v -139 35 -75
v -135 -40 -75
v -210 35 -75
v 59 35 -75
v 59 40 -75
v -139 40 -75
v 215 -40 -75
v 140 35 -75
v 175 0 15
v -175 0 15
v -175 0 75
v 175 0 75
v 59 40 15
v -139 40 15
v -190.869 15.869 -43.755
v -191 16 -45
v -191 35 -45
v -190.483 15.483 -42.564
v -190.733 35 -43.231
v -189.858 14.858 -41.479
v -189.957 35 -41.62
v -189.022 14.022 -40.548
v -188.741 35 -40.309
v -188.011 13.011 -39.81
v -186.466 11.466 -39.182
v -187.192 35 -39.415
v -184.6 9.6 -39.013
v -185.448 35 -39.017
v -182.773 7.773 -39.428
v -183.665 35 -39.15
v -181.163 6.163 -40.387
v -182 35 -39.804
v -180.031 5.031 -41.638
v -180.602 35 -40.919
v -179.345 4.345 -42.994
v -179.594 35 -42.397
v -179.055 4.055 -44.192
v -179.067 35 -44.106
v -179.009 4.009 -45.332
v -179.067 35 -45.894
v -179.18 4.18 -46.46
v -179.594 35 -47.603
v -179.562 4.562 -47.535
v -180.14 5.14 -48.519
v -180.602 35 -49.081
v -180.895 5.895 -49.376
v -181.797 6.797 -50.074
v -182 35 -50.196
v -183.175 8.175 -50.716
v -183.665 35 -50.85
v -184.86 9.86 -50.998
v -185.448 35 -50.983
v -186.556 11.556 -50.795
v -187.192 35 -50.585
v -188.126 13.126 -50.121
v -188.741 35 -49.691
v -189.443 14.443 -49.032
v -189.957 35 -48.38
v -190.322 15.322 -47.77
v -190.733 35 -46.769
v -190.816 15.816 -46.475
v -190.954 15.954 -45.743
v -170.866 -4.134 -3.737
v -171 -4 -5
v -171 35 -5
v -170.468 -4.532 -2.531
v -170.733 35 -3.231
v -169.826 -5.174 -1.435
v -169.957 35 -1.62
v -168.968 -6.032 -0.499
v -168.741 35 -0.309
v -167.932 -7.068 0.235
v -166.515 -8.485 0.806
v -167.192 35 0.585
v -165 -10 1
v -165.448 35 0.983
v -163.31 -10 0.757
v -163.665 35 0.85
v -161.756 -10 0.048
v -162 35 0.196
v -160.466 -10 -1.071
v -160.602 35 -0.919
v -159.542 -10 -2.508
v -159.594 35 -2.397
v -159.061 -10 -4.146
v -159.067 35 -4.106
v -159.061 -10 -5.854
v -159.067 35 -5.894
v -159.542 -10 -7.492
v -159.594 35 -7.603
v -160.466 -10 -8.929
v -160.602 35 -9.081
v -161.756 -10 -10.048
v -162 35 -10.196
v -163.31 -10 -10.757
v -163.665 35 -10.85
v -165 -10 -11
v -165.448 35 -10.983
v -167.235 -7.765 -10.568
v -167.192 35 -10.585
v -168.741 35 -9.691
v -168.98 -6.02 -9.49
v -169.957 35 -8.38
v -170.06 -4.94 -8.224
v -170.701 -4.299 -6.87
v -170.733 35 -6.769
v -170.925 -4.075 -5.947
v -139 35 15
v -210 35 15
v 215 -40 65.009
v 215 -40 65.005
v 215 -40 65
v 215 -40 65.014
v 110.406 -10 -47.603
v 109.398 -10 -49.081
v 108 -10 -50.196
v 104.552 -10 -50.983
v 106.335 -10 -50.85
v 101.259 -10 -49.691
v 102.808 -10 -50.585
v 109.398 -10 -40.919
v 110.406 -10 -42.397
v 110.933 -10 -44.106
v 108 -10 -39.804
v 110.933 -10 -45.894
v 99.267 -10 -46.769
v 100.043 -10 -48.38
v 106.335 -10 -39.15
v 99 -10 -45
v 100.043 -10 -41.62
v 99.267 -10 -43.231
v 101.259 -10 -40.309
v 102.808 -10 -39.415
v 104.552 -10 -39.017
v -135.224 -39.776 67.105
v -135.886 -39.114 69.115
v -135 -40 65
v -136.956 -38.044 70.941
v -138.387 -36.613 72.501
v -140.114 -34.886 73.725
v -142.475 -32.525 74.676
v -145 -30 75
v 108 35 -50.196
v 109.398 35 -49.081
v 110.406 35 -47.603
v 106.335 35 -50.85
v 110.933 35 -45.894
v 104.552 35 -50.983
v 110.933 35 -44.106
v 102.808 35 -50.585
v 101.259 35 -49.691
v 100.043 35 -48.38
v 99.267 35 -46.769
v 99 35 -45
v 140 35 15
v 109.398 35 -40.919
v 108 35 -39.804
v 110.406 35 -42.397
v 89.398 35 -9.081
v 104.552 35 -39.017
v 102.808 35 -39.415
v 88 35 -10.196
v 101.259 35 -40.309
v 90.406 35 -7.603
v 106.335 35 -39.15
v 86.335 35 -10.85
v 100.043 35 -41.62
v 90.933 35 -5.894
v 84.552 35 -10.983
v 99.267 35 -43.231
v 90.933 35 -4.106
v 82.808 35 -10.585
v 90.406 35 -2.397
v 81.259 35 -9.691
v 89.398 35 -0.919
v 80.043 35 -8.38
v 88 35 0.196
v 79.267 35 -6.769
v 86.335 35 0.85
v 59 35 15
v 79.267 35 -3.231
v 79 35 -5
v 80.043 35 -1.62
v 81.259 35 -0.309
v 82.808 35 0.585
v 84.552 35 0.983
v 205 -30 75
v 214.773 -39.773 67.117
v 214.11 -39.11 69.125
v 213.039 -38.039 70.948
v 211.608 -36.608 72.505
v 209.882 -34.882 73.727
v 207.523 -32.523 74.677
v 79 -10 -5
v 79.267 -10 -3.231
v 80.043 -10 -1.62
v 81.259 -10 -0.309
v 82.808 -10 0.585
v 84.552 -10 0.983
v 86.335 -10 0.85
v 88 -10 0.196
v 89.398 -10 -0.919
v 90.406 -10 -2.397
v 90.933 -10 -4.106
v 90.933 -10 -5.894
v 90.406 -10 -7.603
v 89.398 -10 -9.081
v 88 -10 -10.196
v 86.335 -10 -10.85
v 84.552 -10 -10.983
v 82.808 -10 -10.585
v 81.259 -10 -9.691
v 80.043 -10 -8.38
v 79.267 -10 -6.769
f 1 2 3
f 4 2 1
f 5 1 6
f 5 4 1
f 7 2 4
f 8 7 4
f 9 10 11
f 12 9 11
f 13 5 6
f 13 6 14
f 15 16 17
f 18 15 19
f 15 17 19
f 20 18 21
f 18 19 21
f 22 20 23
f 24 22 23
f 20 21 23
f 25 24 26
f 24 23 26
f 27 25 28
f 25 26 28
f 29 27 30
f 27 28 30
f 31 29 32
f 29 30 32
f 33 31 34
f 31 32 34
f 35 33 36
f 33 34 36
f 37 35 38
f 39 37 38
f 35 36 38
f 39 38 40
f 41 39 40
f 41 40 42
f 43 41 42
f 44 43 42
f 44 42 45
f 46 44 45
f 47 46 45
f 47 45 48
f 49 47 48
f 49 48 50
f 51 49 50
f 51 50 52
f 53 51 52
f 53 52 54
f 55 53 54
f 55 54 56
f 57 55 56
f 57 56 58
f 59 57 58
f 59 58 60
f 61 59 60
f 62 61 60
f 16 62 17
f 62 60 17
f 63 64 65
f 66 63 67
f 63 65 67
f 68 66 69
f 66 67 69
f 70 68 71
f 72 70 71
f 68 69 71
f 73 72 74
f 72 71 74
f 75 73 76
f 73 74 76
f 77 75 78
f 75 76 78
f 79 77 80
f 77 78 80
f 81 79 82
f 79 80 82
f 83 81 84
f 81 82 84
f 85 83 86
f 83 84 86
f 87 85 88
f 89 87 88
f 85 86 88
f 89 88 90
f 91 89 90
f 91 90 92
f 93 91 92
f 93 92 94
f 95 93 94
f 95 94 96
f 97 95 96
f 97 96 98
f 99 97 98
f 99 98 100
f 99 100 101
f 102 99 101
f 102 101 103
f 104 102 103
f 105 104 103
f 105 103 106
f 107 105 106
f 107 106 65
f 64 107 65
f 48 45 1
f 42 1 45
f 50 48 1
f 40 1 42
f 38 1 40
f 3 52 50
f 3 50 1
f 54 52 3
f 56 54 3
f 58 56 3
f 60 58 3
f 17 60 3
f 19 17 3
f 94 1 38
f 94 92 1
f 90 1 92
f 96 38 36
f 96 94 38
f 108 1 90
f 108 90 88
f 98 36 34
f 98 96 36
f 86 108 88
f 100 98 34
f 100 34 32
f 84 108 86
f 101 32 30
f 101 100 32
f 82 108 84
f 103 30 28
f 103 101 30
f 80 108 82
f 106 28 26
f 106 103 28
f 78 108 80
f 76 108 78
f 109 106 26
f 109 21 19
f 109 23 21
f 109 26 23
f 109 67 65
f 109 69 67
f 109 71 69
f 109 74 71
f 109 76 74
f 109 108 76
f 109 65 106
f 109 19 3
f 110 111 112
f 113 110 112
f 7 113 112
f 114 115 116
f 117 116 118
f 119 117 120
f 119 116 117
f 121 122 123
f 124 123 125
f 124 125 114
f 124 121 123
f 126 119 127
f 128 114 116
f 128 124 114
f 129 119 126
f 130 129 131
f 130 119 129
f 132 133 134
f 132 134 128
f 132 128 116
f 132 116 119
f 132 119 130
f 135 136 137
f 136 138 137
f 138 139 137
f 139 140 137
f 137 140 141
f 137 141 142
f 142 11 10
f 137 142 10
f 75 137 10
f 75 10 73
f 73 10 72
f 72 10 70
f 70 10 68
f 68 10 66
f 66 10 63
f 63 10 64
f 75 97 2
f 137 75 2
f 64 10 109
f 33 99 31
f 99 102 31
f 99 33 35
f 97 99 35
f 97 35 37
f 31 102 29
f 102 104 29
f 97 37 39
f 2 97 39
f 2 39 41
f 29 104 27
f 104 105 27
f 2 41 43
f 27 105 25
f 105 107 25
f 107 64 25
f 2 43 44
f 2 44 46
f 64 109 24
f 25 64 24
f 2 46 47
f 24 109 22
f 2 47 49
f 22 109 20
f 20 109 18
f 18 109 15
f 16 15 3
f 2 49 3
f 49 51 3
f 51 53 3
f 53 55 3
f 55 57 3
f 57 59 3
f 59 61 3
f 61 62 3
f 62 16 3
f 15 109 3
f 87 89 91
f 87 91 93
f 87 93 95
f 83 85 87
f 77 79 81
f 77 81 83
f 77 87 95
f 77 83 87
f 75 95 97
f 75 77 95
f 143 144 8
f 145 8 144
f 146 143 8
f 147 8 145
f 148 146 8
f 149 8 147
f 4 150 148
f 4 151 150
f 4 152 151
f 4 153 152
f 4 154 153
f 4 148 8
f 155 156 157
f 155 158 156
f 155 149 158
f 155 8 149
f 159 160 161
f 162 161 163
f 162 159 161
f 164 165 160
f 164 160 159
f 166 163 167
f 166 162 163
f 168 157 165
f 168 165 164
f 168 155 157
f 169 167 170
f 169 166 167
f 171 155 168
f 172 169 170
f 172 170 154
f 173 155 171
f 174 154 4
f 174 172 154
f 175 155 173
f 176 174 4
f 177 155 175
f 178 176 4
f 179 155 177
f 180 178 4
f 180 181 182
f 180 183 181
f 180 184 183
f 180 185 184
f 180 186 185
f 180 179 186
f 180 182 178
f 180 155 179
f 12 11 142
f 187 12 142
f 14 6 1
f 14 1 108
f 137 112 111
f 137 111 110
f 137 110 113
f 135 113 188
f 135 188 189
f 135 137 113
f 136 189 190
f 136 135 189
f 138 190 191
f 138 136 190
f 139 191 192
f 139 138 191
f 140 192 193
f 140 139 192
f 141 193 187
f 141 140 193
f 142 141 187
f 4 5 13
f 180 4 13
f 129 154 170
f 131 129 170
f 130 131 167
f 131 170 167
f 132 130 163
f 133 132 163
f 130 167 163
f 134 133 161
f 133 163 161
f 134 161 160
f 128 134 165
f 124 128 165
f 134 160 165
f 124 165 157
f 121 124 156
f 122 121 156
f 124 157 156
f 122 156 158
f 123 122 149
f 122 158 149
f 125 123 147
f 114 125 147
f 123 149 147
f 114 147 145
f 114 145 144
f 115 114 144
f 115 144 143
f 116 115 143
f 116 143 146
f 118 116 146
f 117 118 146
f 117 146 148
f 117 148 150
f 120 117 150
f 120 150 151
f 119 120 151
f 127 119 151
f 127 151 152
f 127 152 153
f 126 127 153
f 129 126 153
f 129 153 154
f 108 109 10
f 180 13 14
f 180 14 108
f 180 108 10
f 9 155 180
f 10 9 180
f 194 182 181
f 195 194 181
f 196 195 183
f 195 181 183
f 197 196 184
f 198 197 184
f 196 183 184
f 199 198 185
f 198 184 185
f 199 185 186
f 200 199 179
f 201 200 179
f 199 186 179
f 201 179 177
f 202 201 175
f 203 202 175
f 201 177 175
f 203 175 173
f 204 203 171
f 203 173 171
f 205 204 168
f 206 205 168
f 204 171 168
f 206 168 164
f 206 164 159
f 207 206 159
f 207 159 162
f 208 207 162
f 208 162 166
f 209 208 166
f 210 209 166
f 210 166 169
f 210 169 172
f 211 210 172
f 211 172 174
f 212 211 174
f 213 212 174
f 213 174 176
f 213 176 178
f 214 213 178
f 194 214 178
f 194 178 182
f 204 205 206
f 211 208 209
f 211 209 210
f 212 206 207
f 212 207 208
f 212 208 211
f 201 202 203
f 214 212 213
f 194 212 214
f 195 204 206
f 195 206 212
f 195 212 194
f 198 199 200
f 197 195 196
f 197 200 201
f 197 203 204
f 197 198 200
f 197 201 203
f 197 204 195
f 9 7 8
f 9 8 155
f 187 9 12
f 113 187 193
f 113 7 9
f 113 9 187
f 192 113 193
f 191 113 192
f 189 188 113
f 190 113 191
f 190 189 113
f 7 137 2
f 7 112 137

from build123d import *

# Parameters (mm, degrees)
F3_DEPTH = 215
F4_SIZE  = 79.99999
F5_R     = 6
F6_DEPTH = 50
F7_W     = 116
F7_H     = 90
F8_DEPTH = 5
F9_R     = 10


# Not quite as in the source:
# - a fillet or chamfer is up to 0.001 mm smaller than in the source, because OpenCascade refuses the exact size


with BuildPart() as f3:
    # F2 (on Right) → F3 (new body, symmetric)
    with BuildSketch(Plane.YZ):
        Polygon((-40, 75), (-40, -75), (40, -75), (40, 15), (0, 15), (0, 75), align=None)
    extrude(amount=F3_DEPTH, both=True)

    # F4 (size 80 in the source; OpenCascade refuses exactly that, so slightly less here)
    f4_edges = [f3.edges().sort_by_distance(p)[0] for p in [
        (215, 40, -30),
        (-215, -40, 0),
    ]]
    chamfer(f4_edges, length=F4_SIZE)

    # F5 (on face) → F6 (cut)
    with BuildSketch(Plane(origin=(0, 40, 0), x_dir=(-1, 0, 0), z_dir=(0, 1, 0))):
        with Locations((-105, -45)):
            Circle(F5_R)
        with Locations((-85, -5)):
            Circle(F5_R)
        with Locations((165, -5)):
            Circle(F5_R)
        with Locations((185, -45)):
            Circle(F5_R)
    extrude(amount=-F6_DEPTH, mode=Mode.SUBTRACT)

    # F7 (on face) → F8 (cut)
    with BuildSketch(Plane(origin=(0, 40, 0), x_dir=(-1, 0, 0), z_dir=(0, 1, 0))):
        with Locations((-117, -30)):
            Rectangle(F7_W, F7_H)
        with Locations((197, -30)):
            Rectangle(F7_W, F7_H)
    extrude(amount=-F8_DEPTH, mode=Mode.SUBTRACT)

    # F9
    f9_edges = [f3.edges().sort_by_distance(p)[0] for p in [
        (39.999995, -40, 75),
    ]]
    fillet(f9_edges, radius=F9_R)


solid = f3.part
